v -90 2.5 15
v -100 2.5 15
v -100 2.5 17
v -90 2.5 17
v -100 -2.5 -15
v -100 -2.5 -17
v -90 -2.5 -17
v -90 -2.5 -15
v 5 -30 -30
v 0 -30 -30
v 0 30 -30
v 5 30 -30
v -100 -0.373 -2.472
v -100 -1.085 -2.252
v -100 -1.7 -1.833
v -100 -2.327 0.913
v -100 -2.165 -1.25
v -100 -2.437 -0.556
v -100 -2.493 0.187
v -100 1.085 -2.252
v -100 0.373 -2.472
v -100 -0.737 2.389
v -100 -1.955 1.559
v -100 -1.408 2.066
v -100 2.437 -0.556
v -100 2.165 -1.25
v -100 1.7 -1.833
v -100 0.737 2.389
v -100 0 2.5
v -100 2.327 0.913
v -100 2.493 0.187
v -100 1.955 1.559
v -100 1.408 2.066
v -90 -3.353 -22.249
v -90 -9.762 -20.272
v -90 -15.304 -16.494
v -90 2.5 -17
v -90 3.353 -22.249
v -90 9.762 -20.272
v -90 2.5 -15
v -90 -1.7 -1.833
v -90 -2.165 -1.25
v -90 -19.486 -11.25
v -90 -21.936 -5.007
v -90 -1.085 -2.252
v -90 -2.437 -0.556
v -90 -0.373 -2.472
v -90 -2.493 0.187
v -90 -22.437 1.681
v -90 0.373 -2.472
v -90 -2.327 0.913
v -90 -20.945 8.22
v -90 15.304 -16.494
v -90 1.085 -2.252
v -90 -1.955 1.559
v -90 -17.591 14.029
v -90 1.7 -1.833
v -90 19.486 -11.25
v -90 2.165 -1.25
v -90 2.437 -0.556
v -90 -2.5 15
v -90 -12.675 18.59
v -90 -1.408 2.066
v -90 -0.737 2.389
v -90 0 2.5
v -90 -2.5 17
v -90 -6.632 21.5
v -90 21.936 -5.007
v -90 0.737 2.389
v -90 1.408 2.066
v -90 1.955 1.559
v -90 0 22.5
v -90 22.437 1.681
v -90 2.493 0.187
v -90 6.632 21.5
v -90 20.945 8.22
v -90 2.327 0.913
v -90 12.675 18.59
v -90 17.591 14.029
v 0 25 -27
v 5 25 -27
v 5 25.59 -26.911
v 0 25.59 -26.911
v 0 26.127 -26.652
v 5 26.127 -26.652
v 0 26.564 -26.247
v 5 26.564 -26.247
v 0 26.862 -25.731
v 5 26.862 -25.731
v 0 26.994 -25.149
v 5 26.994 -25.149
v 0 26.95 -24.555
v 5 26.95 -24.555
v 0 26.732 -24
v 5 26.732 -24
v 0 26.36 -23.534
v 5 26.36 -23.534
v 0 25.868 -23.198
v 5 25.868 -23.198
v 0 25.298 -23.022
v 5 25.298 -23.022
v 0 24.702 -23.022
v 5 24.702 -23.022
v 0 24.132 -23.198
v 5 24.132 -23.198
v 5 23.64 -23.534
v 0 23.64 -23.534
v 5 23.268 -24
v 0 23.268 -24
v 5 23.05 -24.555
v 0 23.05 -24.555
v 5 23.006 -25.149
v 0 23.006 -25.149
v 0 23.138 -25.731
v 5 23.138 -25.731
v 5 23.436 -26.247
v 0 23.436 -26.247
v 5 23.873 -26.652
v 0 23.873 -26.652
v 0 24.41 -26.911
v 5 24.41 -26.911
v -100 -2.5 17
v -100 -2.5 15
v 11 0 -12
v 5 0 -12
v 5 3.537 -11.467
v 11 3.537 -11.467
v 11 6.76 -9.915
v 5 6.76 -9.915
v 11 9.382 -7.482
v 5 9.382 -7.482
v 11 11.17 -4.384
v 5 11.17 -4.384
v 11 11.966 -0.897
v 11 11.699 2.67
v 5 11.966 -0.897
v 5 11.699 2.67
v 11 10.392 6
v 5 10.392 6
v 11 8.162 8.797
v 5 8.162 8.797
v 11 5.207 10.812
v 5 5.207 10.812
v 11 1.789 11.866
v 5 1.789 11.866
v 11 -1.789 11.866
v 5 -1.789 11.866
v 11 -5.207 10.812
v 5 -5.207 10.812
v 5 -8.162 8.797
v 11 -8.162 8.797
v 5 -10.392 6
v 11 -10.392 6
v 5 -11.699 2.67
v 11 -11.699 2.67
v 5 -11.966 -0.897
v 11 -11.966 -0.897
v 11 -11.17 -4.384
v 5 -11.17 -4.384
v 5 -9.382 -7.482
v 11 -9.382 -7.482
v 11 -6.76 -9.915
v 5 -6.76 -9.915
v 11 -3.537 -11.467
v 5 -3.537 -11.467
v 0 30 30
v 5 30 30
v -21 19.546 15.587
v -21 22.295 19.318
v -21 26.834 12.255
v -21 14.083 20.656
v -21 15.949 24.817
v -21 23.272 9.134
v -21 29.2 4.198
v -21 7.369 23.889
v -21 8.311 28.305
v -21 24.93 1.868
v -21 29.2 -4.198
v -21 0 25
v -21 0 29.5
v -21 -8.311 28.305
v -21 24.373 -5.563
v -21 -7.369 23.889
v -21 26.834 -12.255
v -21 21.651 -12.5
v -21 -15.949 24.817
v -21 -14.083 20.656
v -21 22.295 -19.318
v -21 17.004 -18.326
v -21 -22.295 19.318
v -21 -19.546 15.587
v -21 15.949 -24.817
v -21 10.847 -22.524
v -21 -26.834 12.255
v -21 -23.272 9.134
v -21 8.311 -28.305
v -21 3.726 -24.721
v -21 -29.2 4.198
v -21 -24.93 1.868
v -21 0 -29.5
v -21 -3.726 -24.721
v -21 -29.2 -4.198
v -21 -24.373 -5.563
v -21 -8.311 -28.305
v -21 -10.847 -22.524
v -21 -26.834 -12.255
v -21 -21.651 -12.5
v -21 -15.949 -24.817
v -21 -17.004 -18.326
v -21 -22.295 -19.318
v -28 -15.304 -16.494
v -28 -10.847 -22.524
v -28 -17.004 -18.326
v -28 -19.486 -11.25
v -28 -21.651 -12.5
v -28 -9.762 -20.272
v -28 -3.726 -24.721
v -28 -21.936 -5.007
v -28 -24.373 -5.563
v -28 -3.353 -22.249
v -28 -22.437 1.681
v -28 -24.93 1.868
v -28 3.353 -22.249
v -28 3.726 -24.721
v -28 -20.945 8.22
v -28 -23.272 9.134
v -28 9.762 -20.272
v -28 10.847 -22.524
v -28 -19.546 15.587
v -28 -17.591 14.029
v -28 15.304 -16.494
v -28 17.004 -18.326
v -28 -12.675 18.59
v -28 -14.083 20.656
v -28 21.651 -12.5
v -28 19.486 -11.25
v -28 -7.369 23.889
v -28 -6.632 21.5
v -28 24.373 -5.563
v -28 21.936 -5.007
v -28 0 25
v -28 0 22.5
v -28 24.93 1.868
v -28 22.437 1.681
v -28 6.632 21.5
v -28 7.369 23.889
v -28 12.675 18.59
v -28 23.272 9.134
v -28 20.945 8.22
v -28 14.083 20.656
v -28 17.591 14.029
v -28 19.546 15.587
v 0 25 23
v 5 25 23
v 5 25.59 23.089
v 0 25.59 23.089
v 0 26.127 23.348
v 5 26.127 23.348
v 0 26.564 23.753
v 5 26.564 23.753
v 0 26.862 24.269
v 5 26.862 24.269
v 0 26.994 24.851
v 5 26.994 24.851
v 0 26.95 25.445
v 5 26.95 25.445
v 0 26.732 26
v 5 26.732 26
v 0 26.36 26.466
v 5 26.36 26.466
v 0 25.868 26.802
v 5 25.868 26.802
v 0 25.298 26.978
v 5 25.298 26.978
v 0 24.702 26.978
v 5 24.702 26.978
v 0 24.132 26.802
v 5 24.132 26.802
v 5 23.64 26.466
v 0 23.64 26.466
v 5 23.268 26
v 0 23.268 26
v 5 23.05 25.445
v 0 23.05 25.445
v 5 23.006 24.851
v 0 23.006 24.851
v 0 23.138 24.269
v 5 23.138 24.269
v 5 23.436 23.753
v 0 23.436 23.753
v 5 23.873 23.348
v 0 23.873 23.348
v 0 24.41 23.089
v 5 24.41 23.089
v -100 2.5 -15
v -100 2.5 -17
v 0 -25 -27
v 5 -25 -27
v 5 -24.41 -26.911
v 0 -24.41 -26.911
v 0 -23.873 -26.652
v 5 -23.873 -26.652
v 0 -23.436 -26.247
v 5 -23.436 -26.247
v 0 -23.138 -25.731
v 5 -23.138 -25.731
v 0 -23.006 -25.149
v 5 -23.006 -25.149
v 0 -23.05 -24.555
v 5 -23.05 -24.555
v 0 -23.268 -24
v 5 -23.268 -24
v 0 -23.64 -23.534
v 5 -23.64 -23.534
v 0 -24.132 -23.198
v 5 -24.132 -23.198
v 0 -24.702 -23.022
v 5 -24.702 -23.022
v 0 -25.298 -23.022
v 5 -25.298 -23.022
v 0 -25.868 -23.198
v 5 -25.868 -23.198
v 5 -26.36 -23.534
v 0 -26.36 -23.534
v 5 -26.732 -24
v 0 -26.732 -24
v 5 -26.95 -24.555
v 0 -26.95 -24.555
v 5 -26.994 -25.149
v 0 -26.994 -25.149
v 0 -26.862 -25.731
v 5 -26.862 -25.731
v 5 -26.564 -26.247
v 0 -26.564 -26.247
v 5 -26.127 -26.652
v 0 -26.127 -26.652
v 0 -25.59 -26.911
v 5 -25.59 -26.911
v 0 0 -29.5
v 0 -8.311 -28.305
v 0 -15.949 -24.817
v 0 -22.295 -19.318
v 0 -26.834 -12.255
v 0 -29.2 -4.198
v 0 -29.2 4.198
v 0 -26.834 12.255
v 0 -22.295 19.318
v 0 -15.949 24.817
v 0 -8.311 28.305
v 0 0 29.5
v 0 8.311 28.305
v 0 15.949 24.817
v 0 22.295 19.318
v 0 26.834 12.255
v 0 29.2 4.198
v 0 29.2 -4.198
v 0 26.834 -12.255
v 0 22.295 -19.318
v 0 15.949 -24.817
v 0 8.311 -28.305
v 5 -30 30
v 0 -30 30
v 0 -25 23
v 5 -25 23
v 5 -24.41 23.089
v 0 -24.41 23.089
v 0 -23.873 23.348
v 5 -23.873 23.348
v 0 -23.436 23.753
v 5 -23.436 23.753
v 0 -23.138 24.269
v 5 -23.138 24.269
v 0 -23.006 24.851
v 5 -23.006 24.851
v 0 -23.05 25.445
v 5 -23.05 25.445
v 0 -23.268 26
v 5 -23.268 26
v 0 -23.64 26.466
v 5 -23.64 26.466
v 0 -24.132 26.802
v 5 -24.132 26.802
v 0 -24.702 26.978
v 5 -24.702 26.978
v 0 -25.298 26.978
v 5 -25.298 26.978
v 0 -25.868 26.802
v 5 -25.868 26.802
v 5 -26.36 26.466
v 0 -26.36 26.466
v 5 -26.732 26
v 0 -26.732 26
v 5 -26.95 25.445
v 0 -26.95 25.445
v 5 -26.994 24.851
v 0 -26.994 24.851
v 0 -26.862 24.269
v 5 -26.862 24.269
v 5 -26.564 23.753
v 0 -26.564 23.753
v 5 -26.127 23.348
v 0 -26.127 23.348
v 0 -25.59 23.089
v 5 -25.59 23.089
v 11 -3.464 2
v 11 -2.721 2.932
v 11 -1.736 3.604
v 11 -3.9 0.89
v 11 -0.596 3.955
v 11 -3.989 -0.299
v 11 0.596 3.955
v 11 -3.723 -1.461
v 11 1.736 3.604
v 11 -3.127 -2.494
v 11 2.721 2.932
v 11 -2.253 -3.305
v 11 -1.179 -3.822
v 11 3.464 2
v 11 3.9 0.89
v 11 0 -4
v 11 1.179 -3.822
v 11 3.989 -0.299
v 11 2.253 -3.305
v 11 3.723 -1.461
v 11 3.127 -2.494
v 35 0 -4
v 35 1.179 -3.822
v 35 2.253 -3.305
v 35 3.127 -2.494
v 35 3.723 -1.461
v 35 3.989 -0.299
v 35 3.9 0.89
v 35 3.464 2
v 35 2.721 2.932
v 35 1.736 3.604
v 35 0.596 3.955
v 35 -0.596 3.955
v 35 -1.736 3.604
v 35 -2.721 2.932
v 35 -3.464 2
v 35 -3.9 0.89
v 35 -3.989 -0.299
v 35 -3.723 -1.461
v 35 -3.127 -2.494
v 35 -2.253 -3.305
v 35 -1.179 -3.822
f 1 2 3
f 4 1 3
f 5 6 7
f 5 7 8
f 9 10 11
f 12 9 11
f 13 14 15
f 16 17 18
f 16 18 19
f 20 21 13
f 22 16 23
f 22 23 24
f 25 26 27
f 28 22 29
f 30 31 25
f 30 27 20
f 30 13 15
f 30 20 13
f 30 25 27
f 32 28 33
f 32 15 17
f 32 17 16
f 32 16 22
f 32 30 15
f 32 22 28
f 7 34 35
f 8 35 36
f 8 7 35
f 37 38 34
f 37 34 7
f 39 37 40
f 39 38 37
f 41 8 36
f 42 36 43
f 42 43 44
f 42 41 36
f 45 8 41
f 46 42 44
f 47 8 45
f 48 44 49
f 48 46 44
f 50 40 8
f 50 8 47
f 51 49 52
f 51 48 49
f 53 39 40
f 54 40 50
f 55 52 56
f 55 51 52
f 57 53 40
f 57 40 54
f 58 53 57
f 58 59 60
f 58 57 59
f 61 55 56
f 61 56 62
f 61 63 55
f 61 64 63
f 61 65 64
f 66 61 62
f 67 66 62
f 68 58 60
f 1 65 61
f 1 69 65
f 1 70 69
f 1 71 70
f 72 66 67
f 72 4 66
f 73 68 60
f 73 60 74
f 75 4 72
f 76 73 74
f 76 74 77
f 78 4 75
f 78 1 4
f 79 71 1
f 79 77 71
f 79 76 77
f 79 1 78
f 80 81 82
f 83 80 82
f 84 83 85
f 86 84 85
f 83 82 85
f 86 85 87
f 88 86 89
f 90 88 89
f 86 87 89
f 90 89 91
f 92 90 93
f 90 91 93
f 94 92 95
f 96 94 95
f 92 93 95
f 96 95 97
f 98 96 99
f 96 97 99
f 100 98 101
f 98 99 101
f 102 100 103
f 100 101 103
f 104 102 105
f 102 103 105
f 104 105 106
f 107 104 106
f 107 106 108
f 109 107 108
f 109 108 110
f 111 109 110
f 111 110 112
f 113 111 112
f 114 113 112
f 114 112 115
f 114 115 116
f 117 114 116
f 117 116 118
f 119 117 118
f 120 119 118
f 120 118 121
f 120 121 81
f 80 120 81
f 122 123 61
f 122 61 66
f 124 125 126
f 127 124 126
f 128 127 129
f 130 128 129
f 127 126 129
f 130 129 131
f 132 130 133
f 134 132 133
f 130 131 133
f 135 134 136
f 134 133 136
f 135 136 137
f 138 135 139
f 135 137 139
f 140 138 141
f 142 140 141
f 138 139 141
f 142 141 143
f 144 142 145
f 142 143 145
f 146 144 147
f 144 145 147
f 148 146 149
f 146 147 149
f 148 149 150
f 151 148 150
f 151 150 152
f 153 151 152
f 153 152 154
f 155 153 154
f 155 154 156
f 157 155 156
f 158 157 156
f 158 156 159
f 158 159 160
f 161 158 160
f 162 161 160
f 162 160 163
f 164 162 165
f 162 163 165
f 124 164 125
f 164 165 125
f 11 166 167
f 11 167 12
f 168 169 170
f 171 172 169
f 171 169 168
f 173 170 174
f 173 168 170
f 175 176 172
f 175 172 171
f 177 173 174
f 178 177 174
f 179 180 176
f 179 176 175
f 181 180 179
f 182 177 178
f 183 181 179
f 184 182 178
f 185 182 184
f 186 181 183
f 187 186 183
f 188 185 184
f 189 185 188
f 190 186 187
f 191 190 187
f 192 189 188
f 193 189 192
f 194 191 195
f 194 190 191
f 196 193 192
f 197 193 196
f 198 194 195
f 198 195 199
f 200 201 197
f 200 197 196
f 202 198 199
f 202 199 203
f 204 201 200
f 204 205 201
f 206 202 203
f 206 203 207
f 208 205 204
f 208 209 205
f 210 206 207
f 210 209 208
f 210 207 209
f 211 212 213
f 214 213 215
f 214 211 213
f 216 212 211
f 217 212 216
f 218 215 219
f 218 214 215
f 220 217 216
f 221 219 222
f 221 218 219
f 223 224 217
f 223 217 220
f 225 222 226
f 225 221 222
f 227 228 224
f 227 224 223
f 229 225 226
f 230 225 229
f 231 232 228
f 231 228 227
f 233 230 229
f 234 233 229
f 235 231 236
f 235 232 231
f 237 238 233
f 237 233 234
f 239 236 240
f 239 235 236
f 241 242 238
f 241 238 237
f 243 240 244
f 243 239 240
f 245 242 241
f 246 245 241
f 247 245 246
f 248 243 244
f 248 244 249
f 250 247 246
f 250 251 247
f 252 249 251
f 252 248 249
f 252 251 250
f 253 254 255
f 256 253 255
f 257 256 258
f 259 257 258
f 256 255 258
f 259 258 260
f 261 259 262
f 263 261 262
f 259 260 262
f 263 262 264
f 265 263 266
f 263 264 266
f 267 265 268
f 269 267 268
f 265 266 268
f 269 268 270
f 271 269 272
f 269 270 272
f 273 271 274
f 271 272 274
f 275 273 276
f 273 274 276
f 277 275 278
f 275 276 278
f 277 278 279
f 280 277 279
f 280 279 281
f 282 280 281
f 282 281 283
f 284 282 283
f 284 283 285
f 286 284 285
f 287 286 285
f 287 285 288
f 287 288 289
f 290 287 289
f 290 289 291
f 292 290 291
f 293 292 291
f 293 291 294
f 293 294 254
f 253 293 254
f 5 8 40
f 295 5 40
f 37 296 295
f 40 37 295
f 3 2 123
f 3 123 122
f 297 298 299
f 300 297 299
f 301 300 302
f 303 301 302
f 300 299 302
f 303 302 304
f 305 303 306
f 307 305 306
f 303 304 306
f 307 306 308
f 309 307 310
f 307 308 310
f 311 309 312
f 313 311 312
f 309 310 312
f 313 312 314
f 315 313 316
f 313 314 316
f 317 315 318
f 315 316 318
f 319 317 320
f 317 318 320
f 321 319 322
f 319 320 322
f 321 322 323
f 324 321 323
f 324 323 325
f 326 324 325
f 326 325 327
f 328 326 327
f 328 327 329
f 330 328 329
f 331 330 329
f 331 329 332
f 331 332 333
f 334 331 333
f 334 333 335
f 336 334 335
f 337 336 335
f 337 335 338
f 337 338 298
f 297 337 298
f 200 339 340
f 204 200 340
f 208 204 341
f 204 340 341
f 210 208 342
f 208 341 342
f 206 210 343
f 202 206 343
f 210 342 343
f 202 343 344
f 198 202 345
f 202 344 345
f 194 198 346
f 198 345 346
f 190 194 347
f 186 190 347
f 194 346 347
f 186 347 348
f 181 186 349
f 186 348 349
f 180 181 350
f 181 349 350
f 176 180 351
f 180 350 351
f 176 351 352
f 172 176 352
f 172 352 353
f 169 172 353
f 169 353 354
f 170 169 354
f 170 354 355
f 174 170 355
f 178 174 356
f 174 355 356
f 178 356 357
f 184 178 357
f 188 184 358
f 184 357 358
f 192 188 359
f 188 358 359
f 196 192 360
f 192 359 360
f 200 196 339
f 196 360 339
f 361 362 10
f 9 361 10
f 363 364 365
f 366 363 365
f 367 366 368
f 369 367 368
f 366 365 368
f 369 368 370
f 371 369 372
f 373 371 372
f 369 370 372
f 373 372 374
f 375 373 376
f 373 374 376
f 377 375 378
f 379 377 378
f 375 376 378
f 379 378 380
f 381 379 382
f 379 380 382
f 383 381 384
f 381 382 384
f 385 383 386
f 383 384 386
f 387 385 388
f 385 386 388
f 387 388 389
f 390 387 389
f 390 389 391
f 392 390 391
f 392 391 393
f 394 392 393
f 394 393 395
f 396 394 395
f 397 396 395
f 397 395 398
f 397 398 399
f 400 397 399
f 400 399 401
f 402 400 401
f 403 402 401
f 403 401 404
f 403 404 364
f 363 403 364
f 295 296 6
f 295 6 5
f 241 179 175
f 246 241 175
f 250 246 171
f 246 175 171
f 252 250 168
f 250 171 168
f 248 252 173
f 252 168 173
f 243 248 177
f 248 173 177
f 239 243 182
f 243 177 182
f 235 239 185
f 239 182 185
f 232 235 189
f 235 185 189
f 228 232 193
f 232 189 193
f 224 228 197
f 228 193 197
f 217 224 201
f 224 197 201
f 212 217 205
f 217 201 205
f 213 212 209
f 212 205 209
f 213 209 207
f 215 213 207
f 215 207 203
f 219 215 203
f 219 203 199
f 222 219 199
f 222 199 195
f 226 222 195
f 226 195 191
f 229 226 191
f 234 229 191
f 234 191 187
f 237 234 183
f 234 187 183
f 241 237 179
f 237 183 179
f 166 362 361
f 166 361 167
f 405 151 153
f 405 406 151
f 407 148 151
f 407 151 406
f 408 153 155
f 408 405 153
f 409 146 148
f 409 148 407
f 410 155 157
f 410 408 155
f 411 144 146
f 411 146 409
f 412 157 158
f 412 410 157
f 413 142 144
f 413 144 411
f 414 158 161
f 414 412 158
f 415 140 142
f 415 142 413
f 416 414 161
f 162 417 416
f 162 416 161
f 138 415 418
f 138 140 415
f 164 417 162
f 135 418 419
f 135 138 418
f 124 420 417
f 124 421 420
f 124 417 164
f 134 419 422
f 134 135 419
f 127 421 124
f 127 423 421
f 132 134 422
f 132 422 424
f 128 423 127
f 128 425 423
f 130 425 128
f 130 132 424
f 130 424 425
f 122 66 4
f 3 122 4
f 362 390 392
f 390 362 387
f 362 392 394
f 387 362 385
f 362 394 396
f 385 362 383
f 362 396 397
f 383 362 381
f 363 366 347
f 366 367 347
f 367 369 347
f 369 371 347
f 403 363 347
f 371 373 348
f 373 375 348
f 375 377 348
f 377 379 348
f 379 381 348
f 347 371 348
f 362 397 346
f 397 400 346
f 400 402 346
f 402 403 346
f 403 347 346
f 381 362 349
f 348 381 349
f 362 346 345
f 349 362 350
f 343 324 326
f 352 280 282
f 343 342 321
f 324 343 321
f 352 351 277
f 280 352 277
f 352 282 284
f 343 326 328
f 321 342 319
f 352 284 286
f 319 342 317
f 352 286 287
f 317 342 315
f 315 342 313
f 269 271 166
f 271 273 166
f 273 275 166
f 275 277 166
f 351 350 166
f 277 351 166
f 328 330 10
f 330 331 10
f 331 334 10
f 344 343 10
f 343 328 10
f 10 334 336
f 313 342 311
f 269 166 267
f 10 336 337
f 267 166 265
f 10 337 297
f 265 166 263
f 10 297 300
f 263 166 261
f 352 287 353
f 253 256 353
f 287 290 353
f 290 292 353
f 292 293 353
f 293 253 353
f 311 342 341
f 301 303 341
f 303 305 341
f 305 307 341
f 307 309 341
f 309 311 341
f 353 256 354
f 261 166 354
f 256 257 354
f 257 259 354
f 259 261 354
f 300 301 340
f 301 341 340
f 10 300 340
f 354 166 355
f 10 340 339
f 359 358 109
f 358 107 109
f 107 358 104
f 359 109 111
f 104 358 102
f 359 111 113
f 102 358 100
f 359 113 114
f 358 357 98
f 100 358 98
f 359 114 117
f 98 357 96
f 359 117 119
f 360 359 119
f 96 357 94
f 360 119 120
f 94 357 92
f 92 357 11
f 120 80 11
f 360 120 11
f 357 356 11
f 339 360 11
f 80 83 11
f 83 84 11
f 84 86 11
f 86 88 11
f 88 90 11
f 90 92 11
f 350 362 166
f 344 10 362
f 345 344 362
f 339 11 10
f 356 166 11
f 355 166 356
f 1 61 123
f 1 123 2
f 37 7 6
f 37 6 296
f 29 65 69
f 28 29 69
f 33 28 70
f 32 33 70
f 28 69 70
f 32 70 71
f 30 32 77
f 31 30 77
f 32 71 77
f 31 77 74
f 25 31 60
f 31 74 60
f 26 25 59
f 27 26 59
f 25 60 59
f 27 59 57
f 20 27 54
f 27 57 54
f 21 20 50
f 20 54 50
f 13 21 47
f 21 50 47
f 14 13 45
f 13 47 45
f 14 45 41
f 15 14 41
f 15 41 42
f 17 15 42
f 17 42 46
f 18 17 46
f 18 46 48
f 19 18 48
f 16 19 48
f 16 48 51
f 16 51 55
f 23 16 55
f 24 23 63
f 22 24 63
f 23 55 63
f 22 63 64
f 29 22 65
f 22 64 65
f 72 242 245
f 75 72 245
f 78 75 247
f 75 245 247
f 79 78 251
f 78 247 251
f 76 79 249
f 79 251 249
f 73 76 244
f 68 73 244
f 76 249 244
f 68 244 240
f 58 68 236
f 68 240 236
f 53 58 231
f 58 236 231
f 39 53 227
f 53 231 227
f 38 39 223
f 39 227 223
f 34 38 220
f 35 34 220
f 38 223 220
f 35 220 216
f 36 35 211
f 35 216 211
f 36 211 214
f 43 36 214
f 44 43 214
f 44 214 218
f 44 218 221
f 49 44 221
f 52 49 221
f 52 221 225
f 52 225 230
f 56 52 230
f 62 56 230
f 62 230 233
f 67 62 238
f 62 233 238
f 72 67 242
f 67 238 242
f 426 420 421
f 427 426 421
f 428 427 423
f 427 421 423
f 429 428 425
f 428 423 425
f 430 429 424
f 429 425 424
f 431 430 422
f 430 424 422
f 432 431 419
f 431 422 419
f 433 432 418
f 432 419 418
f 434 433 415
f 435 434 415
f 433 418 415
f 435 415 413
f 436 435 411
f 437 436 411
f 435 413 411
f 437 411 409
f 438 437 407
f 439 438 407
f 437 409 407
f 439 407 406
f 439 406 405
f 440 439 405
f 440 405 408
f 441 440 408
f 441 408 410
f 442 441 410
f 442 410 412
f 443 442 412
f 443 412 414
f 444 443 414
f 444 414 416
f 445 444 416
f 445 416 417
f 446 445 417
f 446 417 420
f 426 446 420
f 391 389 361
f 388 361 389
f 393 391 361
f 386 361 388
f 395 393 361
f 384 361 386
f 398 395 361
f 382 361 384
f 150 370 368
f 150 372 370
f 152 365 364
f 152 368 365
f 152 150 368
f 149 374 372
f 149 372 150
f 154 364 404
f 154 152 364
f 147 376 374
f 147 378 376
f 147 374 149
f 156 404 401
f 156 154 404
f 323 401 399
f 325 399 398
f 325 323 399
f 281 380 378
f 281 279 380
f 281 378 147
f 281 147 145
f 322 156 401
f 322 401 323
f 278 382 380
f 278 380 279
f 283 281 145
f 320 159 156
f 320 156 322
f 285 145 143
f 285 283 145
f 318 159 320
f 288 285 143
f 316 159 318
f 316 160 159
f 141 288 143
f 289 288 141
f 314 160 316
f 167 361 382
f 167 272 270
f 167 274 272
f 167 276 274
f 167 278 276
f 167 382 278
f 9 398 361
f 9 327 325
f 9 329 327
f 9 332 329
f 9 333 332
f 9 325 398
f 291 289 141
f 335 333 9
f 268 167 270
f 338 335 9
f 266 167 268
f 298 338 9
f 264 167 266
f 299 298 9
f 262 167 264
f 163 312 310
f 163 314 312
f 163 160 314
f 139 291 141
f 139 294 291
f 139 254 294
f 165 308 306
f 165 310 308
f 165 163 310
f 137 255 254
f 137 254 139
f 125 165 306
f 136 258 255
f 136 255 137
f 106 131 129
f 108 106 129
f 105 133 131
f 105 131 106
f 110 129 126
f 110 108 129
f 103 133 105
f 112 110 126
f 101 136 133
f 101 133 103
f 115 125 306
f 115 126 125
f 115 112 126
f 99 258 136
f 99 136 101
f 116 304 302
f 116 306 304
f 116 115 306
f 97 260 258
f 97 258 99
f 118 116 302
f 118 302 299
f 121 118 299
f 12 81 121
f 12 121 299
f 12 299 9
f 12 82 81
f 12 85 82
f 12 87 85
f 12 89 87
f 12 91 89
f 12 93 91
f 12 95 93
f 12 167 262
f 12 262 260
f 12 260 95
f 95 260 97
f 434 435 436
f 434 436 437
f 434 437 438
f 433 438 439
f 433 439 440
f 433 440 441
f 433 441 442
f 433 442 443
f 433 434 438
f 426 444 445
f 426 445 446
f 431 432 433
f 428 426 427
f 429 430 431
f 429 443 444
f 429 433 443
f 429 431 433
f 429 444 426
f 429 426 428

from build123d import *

# Parameters (mm, degrees)
SKETCH1_W           = 60
SKETCH1_H           = 60
BOSS_EXTRUDE1_DEPTH = 5
SKETCH3_R           = 29.5
BOSS_EXTRUDE2_DEPTH = 21
SKETCH4_R           = 25
BOSS_EXTRUDE3_DEPTH = 7
SKETCH5_R           = 22.5
BOSS_EXTRUDE4_DEPTH = 62
CUT_EXTRUDE1_REACH  = 106.043
SKETCH6_R           = 2
SKETCH7_R           = 12
BOSS_EXTRUDE5_DEPTH = 6
BOSS_EXTRUDE6_START = -6
SKETCH8_R           = 4
BOSS_EXTRUDE6_DEPTH = 30
SKETCH9_R           = 2.5
SKETCH9_W           = 2
SKETCH9_H           = 5
BOSS_EXTRUDE7_DEPTH = 10


with BuildPart() as part:
    # Sketch1 → Boss-Extrude1 (new body)
    with BuildSketch(Plane(origin=(0, 0, 0), x_dir=(0, 0, -1), z_dir=(1, 0, 0))):
        Rectangle(SKETCH1_W, SKETCH1_H)
    extrude(amount=BOSS_EXTRUDE1_DEPTH)

    # Sketch3 → Boss-Extrude2 (add)
    with BuildSketch(Plane.ZY):
        with Locations(Location((0, 0, 0), (0, 0, 180))):
            Circle(SKETCH3_R)
    extrude(amount=BOSS_EXTRUDE2_DEPTH)

    # Sketch4 → Boss-Extrude3 (add)
    with BuildSketch(Plane.ZY.offset(21)):
        Circle(SKETCH4_R)
    extrude(amount=BOSS_EXTRUDE3_DEPTH)

    # Sketch5 → Boss-Extrude4 (add)
    with BuildSketch(Plane.ZY.offset(28)):
        Circle(SKETCH5_R)
    extrude(amount=BOSS_EXTRUDE4_DEPTH)

    # Sketch6 → Cut-Extrude1 (cut, up to next)
    with BuildSketch(Plane(origin=(5, 0, 0), x_dir=(0, 0, -1), z_dir=(1, 0, 0)), mode=Mode.PRIVATE) as cut_extrude1_sk1:
        with Locations((-25, 25)):
            Circle(SKETCH6_R)
    cut_extrude1_tool1 = extrude(cut_extrude1_sk1.sketch, amount=-CUT_EXTRUDE1_REACH, mode=Mode.PRIVATE) & part.part
    # Sketch6 → Cut-Extrude1 (cut, up to next)
    with BuildSketch(Plane(origin=(5, 0, 0), x_dir=(0, 0, -1), z_dir=(1, 0, 0)), mode=Mode.PRIVATE) as cut_extrude1_sk2:
        with Locations((25, 25)):
            Circle(SKETCH6_R)
    cut_extrude1_tool2 = extrude(cut_extrude1_sk2.sketch, amount=-CUT_EXTRUDE1_REACH, mode=Mode.PRIVATE) & part.part
    # Sketch6 → Cut-Extrude1 (cut, up to next)
    with BuildSketch(Plane(origin=(5, 0, 0), x_dir=(0, 0, -1), z_dir=(1, 0, 0)), mode=Mode.PRIVATE) as cut_extrude1_sk3:
        with Locations((25, -25)):
            Circle(SKETCH6_R)
    cut_extrude1_tool3 = extrude(cut_extrude1_sk3.sketch, amount=-CUT_EXTRUDE1_REACH, mode=Mode.PRIVATE) & part.part
    # Sketch6 → Cut-Extrude1 (cut, up to next)
    with BuildSketch(Plane(origin=(5, 0, 0), x_dir=(0, 0, -1), z_dir=(1, 0, 0)), mode=Mode.PRIVATE) as cut_extrude1_sk4:
        with Locations((-25, -25)):
            Circle(SKETCH6_R)
    cut_extrude1_tool4 = extrude(cut_extrude1_sk4.sketch, amount=-CUT_EXTRUDE1_REACH, mode=Mode.PRIVATE) & part.part
    add(cut_extrude1_tool1.solids().sort_by_distance((5, 25, 25))[0], mode=Mode.SUBTRACT)
    add(cut_extrude1_tool2.solids().sort_by_distance((5, 25, -25))[0], mode=Mode.SUBTRACT)
    add(cut_extrude1_tool3.solids().sort_by_distance((5, -25, -25))[0], mode=Mode.SUBTRACT)
    add(cut_extrude1_tool4.solids().sort_by_distance((5, -25, 25))[0], mode=Mode.SUBTRACT)

    # Sketch7 → Boss-Extrude5 (add)
    with BuildSketch(Plane(origin=(5, 0, 0), x_dir=(0, 0, -1), z_dir=(1, 0, 0))):
        Circle(SKETCH7_R)
    extrude(amount=BOSS_EXTRUDE5_DEPTH)

    # Sketch8 → Boss-Extrude6 (add)
    with BuildSketch(Plane(origin=(11, 0, 0), x_dir=(0, 0, -1), z_dir=(1, 0, 0)).offset(BOSS_EXTRUDE6_START)):
        Circle(SKETCH8_R)
    extrude(amount=BOSS_EXTRUDE6_DEPTH)

    # Sketch9 → Boss-Extrude7 (add)
    with BuildSketch(Plane.ZY.offset(90)):
        Circle(SKETCH9_R)
        with Locations((-16, 0)):
            Rectangle(SKETCH9_W, SKETCH9_H)
        with Locations((16, 0)):
            Rectangle(SKETCH9_W, SKETCH9_H)
    extrude(amount=BOSS_EXTRUDE7_DEPTH)


solid = part.part
